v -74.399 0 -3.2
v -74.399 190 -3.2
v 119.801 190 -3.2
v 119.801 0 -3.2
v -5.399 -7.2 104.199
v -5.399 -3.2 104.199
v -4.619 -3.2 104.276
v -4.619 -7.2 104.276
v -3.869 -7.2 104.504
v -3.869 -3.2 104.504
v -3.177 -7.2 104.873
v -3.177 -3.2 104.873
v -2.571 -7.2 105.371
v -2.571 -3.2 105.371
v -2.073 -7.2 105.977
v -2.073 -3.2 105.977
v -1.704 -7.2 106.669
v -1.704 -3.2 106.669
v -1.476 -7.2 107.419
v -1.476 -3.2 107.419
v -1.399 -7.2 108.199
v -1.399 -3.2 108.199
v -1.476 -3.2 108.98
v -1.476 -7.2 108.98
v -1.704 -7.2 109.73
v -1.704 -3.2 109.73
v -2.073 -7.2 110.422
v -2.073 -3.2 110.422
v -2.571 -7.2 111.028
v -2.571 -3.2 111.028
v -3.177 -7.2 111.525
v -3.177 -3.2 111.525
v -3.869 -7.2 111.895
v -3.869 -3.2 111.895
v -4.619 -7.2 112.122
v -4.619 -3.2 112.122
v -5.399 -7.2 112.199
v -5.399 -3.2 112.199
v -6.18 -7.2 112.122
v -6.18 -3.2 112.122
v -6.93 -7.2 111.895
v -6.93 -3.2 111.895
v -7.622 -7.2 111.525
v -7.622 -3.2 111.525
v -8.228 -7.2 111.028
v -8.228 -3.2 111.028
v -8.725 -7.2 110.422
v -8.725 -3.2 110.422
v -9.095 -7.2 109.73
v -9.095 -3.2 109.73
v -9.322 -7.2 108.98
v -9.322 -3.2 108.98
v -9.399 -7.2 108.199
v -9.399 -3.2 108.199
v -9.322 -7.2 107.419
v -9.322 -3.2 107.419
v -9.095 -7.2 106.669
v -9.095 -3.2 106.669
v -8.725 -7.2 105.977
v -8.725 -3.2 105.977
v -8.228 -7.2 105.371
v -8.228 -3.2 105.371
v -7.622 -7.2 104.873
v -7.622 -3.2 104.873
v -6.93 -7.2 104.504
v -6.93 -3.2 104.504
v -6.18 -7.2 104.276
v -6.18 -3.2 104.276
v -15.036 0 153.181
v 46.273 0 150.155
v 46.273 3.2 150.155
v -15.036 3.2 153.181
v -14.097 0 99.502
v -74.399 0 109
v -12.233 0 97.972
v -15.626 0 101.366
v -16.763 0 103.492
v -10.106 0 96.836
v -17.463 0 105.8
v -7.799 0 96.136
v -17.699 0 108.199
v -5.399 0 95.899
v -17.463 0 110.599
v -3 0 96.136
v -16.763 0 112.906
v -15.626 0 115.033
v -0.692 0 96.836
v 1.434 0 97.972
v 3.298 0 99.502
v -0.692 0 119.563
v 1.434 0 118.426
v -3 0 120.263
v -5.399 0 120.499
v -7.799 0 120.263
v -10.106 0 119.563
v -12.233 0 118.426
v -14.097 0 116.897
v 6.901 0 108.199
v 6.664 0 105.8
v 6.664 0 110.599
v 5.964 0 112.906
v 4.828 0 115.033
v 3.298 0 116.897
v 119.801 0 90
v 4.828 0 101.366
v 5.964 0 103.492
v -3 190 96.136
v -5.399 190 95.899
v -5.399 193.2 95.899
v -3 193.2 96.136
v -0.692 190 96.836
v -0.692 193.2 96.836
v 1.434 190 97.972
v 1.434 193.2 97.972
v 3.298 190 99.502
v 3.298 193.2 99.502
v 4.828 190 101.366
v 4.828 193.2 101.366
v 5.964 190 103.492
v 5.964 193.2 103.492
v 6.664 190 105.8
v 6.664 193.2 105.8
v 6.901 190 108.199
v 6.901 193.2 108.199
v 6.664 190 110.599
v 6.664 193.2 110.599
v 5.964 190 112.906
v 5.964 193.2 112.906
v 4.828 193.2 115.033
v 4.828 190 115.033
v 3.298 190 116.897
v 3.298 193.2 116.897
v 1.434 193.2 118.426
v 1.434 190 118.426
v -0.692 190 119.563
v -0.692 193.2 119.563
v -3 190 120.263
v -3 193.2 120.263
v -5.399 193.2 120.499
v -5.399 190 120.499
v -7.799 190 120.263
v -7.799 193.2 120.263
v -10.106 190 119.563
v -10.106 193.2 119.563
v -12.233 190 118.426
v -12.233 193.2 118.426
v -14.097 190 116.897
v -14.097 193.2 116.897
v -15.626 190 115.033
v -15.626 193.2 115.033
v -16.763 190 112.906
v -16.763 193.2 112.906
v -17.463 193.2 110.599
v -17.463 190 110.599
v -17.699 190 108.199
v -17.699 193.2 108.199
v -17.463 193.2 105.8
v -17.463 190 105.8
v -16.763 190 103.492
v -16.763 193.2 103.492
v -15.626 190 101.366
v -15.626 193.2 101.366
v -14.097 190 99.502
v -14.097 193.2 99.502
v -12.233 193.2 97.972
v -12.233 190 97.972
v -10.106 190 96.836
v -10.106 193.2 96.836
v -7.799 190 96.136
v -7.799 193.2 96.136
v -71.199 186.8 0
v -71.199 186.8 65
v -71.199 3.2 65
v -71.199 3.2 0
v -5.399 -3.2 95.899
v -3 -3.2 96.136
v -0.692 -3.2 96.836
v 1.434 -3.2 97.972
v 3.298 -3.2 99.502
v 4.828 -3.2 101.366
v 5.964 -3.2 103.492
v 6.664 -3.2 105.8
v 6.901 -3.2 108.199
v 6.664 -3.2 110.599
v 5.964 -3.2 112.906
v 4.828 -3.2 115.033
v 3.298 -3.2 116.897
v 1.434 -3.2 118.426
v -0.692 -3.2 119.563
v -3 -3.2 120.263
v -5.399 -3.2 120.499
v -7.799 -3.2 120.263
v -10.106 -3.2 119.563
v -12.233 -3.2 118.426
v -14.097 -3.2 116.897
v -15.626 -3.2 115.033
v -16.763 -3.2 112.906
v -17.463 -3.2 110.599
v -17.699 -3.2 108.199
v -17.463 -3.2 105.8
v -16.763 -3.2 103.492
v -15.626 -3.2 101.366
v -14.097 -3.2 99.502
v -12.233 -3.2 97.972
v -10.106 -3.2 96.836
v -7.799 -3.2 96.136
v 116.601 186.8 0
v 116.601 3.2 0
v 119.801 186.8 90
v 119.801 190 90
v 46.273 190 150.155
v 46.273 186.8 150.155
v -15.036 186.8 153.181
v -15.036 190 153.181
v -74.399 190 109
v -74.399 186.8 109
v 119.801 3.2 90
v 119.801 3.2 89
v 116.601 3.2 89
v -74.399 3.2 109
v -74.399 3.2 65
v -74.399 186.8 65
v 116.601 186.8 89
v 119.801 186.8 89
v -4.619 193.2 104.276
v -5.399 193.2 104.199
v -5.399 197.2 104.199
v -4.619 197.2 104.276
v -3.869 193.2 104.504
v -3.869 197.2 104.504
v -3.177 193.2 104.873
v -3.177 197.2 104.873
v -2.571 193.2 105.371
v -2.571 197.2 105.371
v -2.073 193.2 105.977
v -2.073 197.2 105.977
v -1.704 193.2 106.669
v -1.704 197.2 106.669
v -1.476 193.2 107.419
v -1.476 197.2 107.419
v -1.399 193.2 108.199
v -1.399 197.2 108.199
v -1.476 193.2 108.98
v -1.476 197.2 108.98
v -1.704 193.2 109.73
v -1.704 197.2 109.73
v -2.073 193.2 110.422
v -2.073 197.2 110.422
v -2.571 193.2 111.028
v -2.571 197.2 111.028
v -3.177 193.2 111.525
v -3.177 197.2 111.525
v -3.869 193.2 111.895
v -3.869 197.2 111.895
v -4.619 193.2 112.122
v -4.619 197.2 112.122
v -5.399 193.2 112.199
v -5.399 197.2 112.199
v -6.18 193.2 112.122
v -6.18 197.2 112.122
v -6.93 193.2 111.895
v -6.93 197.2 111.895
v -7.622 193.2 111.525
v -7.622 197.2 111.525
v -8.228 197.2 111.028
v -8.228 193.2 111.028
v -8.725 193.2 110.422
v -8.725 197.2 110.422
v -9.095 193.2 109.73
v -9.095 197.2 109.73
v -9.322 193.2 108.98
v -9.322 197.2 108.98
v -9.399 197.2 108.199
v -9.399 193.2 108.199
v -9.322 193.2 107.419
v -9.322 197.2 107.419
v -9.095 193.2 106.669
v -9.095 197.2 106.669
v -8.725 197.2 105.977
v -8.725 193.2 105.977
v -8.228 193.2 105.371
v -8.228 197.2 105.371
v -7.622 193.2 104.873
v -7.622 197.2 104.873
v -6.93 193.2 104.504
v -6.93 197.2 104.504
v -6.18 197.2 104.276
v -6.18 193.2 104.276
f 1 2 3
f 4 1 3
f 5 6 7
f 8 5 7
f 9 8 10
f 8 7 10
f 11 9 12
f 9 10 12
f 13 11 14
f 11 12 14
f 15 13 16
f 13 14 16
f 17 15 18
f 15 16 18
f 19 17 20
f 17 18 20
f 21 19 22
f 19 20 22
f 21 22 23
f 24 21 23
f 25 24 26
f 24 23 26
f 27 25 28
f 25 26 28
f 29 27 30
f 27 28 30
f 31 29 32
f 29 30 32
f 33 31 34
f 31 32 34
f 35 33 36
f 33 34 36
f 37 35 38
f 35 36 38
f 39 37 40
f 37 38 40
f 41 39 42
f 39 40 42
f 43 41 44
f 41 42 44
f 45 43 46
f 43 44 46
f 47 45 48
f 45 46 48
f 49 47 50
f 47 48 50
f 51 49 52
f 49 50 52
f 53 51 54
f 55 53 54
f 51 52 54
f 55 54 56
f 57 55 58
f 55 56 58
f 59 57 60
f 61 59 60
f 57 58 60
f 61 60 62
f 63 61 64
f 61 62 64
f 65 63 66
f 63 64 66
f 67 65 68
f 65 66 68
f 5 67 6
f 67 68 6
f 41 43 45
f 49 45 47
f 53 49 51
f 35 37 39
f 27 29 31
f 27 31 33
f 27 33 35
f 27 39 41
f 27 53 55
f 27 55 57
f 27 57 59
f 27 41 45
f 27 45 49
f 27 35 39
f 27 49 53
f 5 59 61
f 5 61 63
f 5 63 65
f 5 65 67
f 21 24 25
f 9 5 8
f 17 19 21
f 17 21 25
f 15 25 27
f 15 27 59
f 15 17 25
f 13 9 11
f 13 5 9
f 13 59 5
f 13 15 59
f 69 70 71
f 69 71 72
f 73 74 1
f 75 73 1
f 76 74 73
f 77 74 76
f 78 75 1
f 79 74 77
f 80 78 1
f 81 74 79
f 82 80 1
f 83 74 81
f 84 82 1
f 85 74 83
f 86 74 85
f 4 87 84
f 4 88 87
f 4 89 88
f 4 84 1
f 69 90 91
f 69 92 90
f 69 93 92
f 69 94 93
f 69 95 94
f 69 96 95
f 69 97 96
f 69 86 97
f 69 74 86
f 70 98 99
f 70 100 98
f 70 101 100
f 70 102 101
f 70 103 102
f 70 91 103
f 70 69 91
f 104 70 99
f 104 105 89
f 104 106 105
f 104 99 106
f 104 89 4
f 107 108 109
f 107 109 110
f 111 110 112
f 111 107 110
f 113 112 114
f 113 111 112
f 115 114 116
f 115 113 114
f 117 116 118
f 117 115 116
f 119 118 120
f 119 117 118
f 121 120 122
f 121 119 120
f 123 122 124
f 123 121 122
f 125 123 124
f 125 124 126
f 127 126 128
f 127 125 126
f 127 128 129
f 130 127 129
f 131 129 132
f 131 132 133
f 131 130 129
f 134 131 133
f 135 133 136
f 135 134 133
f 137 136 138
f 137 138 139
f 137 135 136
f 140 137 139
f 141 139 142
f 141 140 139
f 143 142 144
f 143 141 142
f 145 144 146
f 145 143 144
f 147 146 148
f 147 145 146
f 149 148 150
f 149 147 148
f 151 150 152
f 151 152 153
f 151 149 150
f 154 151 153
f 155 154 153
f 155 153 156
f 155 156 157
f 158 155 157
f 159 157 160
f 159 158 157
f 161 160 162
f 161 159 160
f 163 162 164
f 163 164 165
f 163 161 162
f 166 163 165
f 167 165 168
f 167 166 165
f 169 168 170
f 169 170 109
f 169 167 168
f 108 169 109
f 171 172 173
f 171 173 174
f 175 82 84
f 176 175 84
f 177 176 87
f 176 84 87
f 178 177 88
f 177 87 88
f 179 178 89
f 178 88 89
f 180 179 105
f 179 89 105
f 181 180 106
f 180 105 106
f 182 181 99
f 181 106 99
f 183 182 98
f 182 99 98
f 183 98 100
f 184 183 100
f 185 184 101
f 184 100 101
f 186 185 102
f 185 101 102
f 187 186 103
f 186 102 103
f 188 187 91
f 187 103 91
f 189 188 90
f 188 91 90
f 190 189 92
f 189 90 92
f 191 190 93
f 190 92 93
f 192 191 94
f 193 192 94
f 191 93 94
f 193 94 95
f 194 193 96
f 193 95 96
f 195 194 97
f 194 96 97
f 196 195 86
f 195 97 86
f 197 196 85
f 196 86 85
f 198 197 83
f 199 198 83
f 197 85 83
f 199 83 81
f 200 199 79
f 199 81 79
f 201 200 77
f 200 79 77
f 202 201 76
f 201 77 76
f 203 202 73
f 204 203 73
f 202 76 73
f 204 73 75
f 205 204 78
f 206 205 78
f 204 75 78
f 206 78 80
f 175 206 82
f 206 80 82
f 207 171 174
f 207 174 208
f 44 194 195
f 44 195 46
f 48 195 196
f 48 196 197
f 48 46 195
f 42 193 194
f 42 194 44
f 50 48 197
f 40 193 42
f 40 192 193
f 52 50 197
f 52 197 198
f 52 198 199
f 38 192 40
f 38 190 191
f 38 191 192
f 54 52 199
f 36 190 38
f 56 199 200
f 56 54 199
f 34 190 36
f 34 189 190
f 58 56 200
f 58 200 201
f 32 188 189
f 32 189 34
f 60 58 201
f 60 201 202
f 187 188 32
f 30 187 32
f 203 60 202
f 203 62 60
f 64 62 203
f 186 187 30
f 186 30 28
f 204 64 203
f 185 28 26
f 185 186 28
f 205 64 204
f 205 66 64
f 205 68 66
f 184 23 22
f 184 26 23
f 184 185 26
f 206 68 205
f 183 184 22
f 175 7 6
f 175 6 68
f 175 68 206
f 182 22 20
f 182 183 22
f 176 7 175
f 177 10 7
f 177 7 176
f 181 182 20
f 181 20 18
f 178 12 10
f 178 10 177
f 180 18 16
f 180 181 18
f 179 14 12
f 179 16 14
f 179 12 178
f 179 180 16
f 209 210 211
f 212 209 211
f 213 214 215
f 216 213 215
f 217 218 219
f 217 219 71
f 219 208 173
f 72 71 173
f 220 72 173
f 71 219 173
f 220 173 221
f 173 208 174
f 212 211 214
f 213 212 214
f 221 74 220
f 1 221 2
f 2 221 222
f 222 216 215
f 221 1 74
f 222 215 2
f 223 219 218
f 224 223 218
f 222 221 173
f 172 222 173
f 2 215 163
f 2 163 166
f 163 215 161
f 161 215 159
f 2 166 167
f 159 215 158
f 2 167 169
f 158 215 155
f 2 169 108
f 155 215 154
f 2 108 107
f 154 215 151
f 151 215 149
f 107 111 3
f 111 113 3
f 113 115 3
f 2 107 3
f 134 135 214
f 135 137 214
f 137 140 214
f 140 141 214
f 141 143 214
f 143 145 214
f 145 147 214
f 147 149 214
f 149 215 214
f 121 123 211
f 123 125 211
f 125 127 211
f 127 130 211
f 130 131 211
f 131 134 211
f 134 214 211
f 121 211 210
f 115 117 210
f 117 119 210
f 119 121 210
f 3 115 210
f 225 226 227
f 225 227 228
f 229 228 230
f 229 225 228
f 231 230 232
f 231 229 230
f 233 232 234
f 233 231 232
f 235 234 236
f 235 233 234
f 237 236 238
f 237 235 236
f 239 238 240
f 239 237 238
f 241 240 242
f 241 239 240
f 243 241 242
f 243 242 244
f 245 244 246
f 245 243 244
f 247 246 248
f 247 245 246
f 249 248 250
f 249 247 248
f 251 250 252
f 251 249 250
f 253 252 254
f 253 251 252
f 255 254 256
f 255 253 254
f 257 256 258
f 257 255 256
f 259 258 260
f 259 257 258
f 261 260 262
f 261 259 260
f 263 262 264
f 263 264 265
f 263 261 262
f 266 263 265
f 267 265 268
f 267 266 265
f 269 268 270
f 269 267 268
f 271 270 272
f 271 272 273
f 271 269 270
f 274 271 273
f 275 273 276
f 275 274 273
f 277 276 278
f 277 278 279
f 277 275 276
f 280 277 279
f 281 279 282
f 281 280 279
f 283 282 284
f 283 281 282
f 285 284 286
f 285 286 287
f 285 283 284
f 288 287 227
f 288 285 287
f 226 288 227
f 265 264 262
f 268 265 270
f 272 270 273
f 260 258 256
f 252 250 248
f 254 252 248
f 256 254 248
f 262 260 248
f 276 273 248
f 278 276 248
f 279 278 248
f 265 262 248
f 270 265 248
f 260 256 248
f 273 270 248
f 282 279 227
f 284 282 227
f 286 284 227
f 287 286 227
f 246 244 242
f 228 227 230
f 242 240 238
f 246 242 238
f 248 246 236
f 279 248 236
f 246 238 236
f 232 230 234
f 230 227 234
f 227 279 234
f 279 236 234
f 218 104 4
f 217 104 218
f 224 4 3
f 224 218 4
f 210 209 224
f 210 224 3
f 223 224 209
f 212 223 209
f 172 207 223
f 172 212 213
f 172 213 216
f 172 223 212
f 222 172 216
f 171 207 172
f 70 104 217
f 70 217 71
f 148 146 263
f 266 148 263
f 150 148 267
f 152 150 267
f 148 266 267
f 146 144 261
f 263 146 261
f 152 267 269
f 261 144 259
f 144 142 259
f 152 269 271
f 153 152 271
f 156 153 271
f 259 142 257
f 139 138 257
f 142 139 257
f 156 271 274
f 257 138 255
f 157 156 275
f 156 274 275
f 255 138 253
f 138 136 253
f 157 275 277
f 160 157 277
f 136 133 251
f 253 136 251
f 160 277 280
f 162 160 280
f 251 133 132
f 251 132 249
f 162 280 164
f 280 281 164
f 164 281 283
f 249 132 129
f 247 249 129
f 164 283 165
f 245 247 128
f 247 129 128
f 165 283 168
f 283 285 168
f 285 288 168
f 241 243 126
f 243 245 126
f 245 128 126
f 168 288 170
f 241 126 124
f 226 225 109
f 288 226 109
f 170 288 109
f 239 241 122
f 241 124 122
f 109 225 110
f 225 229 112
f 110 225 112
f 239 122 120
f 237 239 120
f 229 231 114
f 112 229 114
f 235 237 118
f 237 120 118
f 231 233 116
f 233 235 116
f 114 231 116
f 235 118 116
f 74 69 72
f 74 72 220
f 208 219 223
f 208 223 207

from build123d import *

# Parameters (mm, degrees)
BOSS_EXTRUDE1_DEPTH = 3.2
SKETCH3_R           = 12.3
BOSS_EXTRUDE2_DEPTH = 3.2
SKETCH4_R           = 4
BOSS_EXTRUDE3_DEPTH = 4
SKETCH6_W           = 3.2
SKETCH6_H           = 65
BOSS_EXTRUDE4_DEPTH = 190
SKETCH8_W           = 3.2
SKETCH8_H           = 89
BOSS_EXTRUDE5_DEPTH = 190
SKETCH9_W           = 194.2
SKETCH9_H           = 190
BOSS_EXTRUDE7_DEPTH = 3.2


with BuildPart() as part:
    # Sketch1 → Boss-Extrude1 (new body)
    with BuildSketch(Plane(origin=(0, 0, 0), x_dir=(1, 0, 0), z_dir=(0, 1, 0))):
        Polygon((-71.199297972, 0), (119.800702028, 0), (119.800702028, -90), (46.272924854, -150.155348756), (-15.035731115, -153.181069815), (-74.399297972, -109), (-74.399297972, -65), (-71.199297972, -65), align=None)
    boss_extrude1 = extrude(amount=BOSS_EXTRUDE1_DEPTH)

    # Sketch3 → Boss-Extrude2 (add)
    with BuildSketch(Plane.XZ):
        with Locations(Location((-5.399297972, 108.199281837, 0), (0, 0, 270))):
            Circle(SKETCH3_R)
    boss_extrude2 = extrude(amount=BOSS_EXTRUDE2_DEPTH)

    # Sketch4 → Boss-Extrude3 (add)
    with BuildSketch(Plane.XZ.offset(3.2)):
        with Locations(Location((-5.399297972, 108.199281837, 0), (0, 0, 270))):
            Circle(SKETCH4_R)
    boss_extrude3 = extrude(amount=BOSS_EXTRUDE3_DEPTH)

    # Sketch6 → Boss-Extrude4 (add)
    with BuildSketch(Plane(origin=(0, 0, 0), x_dir=(1, 0, 0), z_dir=(0, 1, 0))):
        with Locations((-72.799297972, -32.5)):
            Rectangle(SKETCH6_W, SKETCH6_H)
    extrude(amount=BOSS_EXTRUDE4_DEPTH)

    # Sketch8 → Boss-Extrude5 (add)
    with BuildSketch(Plane(origin=(0, 0, 0), x_dir=(1, 0, 0), z_dir=(0, 1, 0))):
        with Locations((118.200702028, -44.5)):
            Rectangle(SKETCH8_W, SKETCH8_H)
    extrude(amount=BOSS_EXTRUDE5_DEPTH)

    # Mirror1: Boss-Extrude1, Boss-Extrude2, Boss-Extrude3 across plane
    add(boss_extrude1.mirror(Plane(origin=(0, 95, 0), x_dir=(0, 0, 1), z_dir=(0, -1, 0))))
    add(boss_extrude2.mirror(Plane(origin=(0, 95, 0), x_dir=(0, 0, 1), z_dir=(0, -1, 0))))
    add(boss_extrude3.mirror(Plane(origin=(0, 95, 0), x_dir=(0, 0, 1), z_dir=(0, -1, 0))))

    # Sketch9 → Boss-Extrude7 (add)
    with BuildSketch(Plane.XY):
        with Locations((22.700702028, 95)):
            Rectangle(SKETCH9_W, SKETCH9_H)
    extrude(amount=-BOSS_EXTRUDE7_DEPTH)


solid = part.part
